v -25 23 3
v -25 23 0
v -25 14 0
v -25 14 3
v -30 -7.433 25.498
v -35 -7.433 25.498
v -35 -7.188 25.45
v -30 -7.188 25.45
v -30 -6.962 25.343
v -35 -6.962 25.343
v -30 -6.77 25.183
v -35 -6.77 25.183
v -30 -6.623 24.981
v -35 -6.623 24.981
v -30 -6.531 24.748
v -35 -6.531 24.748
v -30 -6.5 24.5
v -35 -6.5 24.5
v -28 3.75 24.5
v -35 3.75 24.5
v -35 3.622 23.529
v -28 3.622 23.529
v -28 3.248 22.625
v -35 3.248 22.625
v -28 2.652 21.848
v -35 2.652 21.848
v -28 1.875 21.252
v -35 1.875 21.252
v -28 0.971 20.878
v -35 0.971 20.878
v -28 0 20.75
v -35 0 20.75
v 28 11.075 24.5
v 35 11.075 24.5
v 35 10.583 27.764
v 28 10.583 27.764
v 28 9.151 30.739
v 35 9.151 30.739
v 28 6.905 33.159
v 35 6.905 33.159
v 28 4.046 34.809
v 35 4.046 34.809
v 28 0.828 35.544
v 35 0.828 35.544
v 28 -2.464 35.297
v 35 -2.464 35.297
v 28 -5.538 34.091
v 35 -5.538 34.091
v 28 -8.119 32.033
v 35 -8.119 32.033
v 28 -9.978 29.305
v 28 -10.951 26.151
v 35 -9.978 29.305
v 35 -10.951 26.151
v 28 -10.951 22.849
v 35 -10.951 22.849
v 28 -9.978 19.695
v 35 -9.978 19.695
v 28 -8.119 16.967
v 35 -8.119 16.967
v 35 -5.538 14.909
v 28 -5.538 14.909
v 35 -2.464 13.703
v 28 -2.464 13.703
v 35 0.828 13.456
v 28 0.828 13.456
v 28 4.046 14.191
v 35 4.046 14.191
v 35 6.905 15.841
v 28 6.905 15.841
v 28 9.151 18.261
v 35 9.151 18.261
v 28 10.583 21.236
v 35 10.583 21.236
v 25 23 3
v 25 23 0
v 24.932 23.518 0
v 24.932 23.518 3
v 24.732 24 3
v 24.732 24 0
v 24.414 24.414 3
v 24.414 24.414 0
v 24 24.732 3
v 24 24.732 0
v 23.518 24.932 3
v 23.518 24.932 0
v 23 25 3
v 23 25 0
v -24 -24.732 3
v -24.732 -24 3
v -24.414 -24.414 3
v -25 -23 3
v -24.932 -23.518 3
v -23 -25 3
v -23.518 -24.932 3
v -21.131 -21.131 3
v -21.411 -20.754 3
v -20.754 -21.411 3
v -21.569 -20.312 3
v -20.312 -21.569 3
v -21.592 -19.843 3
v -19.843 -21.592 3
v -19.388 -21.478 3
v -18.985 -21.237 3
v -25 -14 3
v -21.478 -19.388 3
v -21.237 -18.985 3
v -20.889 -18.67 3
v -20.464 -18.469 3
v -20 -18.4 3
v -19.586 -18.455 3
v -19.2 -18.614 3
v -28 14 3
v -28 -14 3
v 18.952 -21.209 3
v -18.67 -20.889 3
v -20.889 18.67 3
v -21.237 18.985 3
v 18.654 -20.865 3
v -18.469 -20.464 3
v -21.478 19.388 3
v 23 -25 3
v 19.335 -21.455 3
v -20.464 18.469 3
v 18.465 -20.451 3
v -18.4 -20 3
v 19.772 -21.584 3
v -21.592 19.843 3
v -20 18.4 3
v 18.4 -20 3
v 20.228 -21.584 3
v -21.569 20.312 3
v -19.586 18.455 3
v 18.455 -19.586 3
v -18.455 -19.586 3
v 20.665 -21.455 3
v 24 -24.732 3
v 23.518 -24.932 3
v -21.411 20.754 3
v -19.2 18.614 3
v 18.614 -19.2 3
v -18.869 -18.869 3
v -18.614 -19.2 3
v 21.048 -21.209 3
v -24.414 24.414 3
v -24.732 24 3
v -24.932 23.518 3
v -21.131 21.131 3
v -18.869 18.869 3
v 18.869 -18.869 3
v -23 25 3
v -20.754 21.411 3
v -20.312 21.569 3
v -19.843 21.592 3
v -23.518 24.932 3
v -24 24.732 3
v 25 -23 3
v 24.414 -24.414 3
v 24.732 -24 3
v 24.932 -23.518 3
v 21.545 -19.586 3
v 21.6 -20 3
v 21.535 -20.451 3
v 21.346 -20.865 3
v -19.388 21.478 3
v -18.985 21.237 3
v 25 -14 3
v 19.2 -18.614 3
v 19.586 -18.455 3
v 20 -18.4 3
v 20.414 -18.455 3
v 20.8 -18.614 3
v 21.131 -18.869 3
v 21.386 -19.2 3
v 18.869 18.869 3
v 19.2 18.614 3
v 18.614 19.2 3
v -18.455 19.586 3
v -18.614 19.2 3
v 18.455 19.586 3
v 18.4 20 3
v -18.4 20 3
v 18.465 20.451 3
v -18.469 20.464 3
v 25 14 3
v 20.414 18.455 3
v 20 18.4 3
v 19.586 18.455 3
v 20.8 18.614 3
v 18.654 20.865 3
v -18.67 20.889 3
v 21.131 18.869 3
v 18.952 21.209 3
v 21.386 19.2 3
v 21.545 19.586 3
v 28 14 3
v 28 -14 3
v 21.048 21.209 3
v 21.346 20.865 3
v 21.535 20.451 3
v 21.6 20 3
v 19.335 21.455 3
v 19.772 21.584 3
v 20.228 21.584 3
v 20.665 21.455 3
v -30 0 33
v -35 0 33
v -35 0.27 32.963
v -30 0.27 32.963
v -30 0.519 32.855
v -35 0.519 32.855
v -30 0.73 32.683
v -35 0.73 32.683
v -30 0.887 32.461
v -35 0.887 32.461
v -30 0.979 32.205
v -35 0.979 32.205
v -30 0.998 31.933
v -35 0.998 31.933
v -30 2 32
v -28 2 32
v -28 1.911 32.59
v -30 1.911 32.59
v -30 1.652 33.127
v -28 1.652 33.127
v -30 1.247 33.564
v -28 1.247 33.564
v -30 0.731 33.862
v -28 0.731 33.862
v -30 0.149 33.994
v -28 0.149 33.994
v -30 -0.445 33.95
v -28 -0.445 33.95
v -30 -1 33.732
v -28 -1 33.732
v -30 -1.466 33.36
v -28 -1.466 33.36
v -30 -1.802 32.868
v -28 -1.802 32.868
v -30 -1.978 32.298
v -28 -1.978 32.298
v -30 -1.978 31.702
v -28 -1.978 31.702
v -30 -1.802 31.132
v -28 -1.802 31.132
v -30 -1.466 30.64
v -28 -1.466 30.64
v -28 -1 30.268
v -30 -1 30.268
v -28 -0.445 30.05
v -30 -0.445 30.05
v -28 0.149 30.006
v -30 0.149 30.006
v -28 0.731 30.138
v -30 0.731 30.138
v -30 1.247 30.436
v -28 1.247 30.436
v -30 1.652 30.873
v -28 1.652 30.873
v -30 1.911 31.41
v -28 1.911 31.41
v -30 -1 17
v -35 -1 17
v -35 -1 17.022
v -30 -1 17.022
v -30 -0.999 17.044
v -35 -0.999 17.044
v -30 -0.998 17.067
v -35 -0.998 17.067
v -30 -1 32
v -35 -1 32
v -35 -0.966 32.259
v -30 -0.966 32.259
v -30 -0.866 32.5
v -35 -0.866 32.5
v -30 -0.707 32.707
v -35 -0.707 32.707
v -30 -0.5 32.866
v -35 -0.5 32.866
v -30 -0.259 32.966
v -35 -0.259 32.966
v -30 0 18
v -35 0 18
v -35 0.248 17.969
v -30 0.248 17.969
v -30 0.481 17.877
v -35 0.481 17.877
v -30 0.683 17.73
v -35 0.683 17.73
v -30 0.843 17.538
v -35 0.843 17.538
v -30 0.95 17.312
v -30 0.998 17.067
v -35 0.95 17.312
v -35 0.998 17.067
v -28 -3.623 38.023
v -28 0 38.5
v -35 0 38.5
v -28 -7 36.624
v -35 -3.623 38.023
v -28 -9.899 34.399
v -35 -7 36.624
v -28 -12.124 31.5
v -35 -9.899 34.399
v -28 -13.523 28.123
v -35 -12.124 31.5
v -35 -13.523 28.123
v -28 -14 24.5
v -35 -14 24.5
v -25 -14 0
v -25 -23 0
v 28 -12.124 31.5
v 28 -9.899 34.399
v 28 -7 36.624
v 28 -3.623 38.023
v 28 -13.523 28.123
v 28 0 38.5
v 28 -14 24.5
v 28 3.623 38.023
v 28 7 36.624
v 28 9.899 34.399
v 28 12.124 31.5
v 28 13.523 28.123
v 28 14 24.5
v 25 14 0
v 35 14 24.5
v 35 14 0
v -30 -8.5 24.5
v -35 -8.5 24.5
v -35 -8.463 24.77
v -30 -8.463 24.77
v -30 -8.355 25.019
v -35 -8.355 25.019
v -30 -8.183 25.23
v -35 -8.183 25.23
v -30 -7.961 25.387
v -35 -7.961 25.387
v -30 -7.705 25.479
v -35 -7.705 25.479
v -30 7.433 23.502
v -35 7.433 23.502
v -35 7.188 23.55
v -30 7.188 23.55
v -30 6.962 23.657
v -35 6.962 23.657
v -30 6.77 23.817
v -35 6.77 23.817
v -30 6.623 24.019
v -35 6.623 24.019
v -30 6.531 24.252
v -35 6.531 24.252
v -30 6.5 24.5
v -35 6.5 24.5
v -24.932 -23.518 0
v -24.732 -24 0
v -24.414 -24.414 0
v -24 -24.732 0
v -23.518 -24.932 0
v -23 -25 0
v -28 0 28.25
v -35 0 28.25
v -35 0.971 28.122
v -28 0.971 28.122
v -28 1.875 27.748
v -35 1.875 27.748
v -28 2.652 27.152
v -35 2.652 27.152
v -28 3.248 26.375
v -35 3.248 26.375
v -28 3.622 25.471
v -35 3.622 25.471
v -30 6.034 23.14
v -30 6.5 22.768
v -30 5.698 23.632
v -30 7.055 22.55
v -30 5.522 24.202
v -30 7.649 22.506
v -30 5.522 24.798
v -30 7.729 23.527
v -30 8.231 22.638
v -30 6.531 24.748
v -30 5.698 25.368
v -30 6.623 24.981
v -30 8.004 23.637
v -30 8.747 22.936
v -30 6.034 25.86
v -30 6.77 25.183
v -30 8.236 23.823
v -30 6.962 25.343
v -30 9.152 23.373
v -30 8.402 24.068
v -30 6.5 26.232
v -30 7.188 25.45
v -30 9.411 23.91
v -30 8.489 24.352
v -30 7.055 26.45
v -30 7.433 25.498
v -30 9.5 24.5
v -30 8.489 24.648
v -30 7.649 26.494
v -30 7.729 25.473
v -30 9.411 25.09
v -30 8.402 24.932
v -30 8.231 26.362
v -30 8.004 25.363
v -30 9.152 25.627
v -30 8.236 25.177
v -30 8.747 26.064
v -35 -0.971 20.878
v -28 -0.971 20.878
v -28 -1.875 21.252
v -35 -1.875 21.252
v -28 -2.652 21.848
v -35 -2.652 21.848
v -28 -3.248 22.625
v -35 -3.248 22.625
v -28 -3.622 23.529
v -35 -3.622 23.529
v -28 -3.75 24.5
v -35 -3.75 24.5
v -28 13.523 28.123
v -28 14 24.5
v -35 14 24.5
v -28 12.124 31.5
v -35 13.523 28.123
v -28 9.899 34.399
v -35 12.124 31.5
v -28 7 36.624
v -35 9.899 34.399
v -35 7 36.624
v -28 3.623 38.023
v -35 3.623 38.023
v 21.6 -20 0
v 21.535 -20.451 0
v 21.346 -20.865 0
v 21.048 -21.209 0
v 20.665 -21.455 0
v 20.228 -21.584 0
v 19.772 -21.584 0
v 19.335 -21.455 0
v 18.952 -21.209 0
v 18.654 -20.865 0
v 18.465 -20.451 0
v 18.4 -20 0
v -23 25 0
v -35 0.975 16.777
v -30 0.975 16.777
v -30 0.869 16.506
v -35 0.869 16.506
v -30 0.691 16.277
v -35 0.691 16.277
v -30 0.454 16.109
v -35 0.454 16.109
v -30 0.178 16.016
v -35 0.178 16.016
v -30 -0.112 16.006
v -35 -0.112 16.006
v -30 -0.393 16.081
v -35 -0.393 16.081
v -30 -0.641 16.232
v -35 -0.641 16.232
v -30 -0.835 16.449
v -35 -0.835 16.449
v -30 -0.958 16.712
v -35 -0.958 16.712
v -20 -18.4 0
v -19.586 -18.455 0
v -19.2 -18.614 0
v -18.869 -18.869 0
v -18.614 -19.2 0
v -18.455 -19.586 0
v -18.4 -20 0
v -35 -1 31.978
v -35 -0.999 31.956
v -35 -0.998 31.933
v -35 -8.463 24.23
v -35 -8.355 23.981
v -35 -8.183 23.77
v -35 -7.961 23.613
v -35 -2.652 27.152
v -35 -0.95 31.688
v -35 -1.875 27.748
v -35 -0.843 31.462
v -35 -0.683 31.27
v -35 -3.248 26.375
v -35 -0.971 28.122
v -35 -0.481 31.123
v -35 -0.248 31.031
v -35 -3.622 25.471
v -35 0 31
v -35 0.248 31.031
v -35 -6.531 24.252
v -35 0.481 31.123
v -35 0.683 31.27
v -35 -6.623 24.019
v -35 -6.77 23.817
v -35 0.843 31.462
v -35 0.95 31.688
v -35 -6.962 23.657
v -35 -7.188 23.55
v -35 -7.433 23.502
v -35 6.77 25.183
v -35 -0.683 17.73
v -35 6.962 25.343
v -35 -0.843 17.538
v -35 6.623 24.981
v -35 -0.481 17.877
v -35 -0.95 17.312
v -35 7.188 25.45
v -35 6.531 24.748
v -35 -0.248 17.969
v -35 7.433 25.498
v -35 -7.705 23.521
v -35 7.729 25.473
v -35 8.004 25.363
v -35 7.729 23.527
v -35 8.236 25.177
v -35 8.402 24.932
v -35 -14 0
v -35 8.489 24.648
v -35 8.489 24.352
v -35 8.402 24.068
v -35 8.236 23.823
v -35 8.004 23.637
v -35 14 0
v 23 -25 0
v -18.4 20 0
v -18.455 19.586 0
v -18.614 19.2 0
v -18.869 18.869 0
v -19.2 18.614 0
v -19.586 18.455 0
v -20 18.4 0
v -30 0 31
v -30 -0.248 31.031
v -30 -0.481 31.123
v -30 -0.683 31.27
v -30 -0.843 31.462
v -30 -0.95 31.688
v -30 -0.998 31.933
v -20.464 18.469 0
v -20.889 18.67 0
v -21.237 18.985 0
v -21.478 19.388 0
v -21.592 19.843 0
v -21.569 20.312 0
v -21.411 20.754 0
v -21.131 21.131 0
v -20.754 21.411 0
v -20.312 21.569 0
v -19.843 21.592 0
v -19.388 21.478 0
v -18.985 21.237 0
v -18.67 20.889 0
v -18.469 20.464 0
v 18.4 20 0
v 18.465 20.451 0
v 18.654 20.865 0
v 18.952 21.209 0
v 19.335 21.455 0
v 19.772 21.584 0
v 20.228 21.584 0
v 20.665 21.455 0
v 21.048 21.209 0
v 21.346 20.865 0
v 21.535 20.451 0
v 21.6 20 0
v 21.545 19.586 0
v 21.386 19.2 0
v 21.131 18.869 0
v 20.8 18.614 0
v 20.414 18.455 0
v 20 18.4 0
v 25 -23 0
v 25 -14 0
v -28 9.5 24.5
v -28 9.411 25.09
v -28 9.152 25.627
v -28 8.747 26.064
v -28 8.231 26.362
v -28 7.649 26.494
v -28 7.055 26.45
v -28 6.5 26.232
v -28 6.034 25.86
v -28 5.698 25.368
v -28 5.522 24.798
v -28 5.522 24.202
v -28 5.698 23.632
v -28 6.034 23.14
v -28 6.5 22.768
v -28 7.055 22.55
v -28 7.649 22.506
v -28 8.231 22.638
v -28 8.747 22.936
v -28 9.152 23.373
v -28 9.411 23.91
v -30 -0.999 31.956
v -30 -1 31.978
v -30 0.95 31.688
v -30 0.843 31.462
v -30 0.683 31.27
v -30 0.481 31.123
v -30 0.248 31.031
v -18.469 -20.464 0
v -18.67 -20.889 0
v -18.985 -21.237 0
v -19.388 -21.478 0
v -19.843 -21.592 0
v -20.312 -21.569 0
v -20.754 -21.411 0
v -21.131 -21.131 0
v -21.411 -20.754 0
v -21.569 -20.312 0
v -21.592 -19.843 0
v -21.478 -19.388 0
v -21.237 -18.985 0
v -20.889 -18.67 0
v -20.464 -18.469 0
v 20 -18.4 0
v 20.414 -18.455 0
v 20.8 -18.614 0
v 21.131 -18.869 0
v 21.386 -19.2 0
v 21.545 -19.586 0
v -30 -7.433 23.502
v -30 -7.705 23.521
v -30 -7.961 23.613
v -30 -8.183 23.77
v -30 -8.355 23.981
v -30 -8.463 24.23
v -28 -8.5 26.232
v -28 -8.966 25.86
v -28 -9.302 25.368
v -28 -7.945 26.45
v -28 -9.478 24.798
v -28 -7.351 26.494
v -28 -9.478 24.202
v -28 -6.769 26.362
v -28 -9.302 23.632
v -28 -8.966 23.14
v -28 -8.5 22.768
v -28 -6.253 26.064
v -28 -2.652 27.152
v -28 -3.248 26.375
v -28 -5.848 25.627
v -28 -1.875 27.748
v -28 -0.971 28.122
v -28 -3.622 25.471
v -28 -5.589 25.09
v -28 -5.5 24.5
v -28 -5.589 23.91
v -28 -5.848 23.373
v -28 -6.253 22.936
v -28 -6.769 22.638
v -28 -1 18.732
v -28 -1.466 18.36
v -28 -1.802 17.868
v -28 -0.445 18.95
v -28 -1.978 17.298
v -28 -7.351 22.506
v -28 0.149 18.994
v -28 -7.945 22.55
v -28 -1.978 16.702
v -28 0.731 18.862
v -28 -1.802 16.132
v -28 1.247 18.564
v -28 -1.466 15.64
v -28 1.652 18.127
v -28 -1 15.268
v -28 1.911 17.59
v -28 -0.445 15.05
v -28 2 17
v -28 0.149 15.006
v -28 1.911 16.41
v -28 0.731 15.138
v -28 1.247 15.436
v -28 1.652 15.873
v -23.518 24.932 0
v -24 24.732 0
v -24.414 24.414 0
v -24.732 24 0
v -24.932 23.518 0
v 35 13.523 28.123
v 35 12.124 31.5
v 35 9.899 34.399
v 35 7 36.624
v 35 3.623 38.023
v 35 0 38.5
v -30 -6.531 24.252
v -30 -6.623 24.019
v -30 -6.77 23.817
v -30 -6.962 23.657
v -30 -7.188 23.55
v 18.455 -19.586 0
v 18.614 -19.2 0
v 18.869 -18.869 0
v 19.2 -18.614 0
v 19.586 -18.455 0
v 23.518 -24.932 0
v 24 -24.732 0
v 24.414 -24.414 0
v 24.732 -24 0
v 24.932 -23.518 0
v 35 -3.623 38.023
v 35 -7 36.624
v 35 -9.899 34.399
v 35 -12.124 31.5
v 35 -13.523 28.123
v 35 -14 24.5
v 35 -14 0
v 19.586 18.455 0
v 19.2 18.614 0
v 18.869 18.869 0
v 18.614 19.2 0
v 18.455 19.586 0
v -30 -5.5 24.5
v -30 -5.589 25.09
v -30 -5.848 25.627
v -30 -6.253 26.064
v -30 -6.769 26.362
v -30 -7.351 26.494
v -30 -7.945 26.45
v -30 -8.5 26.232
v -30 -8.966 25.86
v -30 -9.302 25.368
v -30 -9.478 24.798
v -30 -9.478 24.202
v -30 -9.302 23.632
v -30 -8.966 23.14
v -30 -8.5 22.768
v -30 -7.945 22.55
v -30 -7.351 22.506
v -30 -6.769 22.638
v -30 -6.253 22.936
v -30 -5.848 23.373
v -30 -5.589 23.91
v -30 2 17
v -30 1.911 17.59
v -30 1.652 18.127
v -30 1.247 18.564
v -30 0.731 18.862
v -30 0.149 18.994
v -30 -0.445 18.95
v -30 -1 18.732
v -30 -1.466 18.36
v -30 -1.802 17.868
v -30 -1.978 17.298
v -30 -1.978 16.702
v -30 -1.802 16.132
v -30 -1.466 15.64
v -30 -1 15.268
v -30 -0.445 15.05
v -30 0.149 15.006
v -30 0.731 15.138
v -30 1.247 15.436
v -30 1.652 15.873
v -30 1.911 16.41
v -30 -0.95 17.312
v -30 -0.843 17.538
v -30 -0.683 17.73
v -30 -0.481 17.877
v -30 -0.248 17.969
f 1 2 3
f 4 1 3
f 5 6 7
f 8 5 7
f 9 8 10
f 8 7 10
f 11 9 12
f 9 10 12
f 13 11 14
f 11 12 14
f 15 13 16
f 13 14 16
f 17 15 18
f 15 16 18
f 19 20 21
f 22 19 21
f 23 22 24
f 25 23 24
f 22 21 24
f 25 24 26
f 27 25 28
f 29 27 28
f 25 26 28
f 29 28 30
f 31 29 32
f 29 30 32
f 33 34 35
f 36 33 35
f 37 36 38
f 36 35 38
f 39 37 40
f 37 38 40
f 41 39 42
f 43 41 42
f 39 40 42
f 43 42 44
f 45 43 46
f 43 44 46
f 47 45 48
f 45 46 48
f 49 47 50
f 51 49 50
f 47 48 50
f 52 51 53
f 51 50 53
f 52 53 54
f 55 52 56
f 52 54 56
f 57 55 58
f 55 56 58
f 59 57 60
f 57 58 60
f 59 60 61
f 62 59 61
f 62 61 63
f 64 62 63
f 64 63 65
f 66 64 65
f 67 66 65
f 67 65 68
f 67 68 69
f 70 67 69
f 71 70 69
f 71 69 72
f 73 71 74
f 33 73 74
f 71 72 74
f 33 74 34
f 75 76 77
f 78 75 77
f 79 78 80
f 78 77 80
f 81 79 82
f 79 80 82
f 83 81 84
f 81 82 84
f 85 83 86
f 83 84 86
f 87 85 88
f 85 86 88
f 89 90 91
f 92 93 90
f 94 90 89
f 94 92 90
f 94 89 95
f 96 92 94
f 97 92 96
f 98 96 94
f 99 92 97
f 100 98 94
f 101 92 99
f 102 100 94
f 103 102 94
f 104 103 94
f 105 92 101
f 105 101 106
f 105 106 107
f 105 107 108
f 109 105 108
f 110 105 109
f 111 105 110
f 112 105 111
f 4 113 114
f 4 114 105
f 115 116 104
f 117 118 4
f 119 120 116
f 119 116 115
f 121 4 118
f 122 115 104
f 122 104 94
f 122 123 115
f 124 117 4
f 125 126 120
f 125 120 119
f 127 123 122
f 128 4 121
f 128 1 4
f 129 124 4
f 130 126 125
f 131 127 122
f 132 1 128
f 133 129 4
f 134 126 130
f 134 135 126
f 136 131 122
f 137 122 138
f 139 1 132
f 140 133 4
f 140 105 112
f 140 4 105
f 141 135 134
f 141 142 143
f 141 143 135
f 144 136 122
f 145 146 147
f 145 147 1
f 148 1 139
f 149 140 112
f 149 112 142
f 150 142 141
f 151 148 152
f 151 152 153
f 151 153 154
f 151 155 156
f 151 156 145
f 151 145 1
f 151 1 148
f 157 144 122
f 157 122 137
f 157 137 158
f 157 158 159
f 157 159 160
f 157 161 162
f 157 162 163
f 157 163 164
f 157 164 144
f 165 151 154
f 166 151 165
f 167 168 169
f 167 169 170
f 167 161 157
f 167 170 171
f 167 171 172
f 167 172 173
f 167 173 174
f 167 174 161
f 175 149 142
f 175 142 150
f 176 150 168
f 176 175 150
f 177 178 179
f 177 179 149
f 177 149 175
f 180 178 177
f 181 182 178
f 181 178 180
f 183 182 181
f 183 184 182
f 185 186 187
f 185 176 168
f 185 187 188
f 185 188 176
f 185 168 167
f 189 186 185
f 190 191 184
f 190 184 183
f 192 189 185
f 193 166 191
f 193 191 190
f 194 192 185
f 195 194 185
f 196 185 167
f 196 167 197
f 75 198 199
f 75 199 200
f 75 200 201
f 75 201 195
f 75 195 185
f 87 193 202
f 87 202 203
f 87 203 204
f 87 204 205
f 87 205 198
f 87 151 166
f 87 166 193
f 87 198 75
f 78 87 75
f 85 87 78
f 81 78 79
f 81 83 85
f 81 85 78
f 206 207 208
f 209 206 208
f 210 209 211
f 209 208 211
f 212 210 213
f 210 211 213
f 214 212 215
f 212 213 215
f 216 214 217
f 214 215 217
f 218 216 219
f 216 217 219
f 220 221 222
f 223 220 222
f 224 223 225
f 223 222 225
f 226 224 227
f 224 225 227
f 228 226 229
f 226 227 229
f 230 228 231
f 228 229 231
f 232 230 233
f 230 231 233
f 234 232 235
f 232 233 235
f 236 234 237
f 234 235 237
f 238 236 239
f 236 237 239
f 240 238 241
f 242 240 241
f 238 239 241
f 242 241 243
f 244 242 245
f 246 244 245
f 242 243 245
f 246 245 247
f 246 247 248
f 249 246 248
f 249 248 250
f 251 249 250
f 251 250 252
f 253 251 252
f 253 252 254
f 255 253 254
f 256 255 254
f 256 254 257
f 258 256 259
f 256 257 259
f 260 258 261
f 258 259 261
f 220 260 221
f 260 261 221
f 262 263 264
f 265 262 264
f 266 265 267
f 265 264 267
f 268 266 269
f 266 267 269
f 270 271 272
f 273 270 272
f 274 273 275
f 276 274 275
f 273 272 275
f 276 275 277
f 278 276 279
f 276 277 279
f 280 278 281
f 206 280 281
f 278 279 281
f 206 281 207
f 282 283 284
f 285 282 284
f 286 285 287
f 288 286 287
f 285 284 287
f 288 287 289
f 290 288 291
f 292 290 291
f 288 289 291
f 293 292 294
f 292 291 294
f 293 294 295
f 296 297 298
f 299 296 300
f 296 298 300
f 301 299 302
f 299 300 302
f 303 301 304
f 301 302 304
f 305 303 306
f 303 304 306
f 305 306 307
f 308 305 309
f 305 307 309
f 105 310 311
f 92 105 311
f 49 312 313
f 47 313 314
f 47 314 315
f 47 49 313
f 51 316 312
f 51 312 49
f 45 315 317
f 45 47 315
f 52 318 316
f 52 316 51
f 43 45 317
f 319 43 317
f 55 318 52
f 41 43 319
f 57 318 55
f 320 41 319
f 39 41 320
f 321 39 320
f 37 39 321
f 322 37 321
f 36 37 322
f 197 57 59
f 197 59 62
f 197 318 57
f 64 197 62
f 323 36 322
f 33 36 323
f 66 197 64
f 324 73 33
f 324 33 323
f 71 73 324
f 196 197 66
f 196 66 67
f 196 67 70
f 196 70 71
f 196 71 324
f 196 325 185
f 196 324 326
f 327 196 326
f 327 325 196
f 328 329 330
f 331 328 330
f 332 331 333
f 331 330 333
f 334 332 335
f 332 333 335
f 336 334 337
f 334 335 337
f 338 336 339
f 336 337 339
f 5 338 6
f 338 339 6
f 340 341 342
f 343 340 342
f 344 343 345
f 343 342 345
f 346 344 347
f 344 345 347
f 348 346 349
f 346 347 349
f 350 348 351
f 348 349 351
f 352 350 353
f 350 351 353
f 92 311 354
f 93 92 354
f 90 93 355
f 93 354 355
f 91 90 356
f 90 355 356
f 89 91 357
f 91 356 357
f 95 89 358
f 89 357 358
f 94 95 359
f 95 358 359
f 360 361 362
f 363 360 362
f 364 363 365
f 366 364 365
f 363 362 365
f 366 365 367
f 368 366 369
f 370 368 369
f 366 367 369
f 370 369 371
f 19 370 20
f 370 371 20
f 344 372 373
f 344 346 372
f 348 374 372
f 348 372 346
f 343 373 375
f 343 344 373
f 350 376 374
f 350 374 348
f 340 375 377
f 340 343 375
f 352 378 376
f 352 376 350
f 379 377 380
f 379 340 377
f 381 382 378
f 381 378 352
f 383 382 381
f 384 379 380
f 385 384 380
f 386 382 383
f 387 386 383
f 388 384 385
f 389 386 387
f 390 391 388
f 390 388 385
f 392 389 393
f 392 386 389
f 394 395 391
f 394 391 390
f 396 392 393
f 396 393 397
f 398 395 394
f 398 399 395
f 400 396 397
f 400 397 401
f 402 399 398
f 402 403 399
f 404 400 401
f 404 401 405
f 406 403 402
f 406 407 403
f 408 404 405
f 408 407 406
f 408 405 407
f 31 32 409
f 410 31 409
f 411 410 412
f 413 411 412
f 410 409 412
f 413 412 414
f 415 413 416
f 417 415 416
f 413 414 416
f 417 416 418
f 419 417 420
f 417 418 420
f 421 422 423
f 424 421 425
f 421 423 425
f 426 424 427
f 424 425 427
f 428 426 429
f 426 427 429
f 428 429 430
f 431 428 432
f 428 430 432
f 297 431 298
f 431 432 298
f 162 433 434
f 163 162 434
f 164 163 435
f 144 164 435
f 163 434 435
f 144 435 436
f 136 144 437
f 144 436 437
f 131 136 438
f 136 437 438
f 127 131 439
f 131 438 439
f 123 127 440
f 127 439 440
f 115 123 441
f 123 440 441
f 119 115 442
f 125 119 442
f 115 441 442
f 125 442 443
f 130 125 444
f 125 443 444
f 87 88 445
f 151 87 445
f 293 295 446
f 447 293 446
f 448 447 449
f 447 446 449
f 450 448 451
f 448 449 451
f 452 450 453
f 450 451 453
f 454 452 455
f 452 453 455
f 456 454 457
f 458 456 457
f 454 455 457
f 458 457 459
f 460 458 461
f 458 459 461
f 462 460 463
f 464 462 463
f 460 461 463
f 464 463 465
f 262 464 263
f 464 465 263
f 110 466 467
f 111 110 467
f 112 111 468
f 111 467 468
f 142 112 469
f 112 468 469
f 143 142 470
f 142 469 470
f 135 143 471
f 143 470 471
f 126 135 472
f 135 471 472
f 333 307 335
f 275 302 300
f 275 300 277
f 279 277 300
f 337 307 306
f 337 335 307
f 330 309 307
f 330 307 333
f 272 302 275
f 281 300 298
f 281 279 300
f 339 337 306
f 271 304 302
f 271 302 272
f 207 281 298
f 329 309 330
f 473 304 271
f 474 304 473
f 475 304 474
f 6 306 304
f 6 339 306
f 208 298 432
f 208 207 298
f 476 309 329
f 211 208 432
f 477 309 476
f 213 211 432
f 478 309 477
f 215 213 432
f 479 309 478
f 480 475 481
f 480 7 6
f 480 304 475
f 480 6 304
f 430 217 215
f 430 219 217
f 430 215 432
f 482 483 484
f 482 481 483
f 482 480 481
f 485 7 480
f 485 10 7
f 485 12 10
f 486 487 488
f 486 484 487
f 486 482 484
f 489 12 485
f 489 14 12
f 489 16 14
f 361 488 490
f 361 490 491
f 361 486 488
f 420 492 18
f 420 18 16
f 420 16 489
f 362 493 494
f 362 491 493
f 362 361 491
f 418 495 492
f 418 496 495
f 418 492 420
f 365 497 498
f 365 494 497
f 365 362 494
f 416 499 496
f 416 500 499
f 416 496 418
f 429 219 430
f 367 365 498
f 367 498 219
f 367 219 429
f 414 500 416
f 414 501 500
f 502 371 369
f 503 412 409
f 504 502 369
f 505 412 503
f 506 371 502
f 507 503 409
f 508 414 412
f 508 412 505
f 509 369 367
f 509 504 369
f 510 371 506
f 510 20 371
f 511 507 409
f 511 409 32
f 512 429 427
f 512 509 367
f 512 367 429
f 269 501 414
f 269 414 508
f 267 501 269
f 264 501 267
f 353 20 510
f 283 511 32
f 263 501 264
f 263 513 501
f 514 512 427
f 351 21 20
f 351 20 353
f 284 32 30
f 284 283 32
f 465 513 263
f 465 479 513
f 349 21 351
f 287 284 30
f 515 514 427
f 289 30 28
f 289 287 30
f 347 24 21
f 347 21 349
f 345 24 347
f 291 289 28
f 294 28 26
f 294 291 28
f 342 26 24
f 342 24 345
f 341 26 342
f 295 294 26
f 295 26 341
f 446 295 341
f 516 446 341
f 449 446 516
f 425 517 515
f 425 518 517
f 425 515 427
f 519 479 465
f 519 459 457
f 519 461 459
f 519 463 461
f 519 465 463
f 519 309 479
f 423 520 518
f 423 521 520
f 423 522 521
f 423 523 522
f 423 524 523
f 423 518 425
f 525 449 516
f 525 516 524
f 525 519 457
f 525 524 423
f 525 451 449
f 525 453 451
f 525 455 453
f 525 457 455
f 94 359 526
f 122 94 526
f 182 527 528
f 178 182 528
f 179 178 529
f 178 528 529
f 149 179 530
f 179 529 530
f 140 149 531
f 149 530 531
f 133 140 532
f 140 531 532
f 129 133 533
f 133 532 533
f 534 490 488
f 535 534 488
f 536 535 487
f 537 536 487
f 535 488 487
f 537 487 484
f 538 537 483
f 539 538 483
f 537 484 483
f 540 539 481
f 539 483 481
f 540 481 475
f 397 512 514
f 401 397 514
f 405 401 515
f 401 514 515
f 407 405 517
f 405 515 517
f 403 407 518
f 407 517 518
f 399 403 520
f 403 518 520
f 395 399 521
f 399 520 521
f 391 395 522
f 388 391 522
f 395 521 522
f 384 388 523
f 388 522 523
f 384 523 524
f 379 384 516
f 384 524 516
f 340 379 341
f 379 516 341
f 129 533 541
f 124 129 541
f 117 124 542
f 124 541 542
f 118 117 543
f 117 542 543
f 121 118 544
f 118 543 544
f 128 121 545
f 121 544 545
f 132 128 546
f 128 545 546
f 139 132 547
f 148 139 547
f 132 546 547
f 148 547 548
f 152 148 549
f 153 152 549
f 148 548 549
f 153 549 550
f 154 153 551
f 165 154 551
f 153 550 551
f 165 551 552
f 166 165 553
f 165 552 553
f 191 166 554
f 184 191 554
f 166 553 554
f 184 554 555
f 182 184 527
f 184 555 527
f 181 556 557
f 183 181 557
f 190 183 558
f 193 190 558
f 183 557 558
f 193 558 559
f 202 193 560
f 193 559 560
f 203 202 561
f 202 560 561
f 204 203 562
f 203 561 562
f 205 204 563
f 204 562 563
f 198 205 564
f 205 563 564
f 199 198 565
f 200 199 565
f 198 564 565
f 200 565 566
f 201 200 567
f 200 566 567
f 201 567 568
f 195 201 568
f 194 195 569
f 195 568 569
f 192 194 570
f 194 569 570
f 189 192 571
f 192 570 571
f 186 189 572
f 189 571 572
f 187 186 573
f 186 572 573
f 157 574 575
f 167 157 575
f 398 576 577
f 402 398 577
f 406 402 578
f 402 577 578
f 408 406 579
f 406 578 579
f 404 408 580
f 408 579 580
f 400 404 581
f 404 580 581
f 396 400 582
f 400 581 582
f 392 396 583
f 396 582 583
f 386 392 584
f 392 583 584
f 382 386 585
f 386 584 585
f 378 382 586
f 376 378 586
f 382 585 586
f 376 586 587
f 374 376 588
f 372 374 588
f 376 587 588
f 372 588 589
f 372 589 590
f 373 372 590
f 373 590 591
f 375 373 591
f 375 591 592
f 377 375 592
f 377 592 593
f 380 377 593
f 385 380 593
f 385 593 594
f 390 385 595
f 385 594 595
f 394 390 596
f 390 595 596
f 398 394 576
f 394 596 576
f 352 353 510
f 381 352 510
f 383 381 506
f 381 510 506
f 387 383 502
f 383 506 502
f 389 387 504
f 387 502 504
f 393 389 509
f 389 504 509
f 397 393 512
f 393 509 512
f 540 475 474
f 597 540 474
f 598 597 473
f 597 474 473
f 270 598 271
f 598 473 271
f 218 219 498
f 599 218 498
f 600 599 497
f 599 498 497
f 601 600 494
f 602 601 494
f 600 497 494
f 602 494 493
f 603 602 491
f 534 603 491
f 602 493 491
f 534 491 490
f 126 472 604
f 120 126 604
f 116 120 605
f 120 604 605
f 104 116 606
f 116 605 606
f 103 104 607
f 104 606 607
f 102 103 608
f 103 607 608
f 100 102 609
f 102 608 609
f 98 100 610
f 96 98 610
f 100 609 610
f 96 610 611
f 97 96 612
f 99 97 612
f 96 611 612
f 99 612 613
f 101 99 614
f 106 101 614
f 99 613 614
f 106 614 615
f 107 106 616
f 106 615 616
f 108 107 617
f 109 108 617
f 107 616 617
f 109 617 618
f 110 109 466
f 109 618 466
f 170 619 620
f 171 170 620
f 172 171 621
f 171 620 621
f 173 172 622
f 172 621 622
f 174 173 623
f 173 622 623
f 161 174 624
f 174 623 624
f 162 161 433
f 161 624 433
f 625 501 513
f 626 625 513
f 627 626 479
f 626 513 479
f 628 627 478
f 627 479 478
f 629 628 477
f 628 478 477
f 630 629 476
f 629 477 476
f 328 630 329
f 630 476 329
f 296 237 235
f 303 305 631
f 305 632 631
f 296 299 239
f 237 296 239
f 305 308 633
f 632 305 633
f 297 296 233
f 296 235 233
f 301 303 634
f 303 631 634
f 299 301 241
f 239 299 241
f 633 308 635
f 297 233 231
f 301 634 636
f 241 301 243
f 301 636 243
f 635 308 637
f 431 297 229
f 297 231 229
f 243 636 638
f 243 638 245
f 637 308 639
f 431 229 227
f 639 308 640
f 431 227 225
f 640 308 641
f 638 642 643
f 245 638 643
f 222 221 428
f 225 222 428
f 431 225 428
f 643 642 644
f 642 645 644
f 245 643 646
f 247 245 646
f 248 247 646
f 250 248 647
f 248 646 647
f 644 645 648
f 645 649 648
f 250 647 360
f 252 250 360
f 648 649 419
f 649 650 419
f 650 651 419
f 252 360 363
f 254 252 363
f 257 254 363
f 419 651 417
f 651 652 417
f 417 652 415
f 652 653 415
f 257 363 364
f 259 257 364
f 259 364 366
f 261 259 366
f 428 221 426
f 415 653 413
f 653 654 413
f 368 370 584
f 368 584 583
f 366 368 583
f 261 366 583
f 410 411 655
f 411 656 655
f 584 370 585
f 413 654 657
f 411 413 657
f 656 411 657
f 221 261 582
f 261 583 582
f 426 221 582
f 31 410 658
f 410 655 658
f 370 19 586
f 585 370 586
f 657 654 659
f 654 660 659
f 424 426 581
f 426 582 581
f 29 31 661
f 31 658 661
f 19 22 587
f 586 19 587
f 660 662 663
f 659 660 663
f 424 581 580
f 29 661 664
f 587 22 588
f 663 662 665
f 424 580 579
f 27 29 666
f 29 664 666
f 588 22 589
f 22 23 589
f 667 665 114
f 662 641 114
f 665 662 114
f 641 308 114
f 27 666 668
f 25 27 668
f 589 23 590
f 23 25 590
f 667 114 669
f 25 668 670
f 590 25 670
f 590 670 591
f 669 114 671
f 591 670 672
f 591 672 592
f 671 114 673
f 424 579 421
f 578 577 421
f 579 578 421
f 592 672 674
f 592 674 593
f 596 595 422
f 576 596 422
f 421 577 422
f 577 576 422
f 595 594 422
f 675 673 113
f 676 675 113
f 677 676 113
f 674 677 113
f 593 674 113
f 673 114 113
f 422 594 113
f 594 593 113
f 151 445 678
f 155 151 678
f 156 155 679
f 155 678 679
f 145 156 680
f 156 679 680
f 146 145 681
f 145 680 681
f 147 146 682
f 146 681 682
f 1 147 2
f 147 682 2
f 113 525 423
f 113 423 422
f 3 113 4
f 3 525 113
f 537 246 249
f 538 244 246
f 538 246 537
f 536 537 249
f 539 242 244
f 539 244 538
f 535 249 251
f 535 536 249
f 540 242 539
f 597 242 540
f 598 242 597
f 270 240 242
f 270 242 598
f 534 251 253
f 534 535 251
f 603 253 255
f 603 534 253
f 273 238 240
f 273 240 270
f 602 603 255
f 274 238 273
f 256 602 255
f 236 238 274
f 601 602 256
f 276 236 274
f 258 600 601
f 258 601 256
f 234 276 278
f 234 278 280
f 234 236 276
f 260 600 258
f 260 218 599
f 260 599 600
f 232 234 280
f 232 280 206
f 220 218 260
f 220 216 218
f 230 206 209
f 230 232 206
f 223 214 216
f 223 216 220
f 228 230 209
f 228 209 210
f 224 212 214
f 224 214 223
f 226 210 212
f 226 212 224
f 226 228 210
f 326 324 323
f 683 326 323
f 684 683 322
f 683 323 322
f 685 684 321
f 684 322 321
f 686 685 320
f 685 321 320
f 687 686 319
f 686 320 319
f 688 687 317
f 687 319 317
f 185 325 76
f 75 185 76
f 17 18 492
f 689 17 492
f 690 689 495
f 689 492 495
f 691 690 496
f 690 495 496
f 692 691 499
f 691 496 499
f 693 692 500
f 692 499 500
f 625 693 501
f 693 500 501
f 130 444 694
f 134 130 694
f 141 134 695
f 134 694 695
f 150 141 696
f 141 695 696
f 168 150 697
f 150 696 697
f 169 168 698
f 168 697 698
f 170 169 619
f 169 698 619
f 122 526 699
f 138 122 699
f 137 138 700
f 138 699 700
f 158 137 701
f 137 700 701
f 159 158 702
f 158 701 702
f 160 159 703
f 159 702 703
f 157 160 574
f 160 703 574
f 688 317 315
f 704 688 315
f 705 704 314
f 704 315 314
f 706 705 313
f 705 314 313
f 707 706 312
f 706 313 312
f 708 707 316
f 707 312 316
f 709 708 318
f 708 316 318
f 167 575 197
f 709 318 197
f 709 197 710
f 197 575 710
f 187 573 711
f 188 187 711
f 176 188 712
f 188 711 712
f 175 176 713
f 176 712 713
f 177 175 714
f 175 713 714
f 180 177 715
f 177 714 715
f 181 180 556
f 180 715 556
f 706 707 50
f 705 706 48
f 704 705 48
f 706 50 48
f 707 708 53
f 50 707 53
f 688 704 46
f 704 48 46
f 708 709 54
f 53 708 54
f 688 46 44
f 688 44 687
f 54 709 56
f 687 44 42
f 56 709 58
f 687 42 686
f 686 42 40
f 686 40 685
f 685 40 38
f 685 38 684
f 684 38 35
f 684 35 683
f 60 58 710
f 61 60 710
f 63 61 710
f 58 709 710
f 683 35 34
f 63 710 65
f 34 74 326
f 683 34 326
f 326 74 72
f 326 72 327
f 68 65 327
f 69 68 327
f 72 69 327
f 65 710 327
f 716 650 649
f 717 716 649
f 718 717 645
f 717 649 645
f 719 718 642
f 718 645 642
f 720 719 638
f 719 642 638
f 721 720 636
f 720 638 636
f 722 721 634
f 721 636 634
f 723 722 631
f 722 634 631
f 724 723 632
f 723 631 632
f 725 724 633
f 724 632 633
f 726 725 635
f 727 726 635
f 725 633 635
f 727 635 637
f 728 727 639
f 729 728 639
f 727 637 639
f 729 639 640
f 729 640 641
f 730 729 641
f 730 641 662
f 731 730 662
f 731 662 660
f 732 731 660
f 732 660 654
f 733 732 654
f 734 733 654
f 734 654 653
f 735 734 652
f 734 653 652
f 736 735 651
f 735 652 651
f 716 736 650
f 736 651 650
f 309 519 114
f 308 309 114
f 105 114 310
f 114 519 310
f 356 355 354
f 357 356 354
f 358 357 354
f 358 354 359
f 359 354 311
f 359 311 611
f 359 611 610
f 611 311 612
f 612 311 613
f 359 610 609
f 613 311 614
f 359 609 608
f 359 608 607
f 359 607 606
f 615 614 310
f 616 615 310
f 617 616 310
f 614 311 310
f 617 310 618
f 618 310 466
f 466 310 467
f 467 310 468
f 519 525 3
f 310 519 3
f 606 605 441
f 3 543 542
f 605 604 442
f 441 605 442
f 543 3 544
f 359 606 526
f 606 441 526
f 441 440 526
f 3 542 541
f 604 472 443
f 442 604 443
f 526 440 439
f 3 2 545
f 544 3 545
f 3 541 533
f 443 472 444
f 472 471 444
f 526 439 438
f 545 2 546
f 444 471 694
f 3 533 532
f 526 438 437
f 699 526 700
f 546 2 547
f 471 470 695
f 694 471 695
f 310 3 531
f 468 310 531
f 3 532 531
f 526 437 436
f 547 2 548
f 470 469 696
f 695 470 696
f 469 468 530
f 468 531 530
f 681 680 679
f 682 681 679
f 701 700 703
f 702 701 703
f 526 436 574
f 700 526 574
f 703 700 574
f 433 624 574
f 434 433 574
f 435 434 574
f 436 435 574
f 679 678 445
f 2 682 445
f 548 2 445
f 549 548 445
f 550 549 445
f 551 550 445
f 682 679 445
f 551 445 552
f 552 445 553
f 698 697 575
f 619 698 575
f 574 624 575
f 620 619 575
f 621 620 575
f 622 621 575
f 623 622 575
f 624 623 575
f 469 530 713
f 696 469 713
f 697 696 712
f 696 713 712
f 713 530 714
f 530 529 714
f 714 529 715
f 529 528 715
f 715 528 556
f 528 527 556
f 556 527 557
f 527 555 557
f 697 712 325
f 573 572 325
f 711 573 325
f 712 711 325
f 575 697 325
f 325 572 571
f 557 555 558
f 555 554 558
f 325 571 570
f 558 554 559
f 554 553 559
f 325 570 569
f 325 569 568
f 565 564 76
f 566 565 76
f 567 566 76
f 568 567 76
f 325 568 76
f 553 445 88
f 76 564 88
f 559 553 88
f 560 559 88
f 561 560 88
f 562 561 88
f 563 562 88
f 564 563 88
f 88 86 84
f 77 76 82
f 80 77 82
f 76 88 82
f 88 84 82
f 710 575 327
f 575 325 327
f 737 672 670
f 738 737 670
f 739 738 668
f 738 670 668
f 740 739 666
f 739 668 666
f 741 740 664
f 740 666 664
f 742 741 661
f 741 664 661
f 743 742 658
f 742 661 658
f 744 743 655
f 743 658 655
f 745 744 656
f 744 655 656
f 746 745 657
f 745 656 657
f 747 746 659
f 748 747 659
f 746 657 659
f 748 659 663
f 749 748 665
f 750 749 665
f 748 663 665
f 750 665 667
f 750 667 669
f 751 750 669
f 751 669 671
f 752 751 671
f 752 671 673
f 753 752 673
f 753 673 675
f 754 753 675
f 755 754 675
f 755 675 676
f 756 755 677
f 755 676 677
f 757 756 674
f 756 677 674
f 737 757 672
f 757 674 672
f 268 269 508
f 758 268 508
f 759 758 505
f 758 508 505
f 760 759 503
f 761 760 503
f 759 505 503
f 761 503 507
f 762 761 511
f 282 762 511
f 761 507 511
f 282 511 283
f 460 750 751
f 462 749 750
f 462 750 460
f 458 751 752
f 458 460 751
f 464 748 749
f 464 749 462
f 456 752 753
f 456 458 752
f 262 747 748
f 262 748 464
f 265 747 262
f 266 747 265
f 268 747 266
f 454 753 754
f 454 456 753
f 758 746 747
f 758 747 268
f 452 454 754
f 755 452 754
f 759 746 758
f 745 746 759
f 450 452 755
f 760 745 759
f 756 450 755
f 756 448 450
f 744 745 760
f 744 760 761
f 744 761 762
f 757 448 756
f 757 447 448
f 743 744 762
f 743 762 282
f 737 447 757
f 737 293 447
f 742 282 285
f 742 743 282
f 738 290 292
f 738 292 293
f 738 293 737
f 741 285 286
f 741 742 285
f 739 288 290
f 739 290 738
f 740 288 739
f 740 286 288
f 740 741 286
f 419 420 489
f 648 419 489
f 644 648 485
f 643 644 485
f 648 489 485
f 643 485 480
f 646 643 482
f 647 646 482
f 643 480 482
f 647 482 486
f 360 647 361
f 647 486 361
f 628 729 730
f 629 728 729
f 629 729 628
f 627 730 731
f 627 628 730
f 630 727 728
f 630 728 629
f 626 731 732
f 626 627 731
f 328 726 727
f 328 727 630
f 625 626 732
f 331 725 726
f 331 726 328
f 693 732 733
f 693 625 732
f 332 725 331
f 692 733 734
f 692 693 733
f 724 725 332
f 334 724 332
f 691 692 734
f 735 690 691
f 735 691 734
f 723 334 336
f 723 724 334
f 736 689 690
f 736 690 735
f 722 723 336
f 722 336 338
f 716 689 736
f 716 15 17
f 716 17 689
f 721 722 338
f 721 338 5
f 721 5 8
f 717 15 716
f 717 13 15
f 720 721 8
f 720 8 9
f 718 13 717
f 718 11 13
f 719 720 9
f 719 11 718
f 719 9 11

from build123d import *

# Parameters (mm, degrees)
F0_W      = 10
F0_H      = 14
F1_DEPTH  = 3
F2_W      = 7
F2_H      = 28
F3_DEPTH  = 35.5
F5_DEPTH  = 70.001
F6_R      = 11.075
F7_DEPTH  = 7
F9_DEPTH  = 25
F10_R     = 2
F11_DEPTH = 2


with BuildPart() as f1:
    # F0 (on Top) → F1 (new body)
    with BuildSketch(Plane.XY):
        with BuildLine():
            ThreePointArc((25, 23), (24.4142135624, 24.4142135624), (23, 25))
            Line((23, 25), (-23, 25))
            ThreePointArc((-23, 25), (-24.4142135624, 24.4142135624), (-25, 23))
            Line((-25, 23), (-25, 14))
            Line((-25, 14), (-25, 0))
            Line((-25, 0), (-25, -14))
            Line((-25, -14), (-25, -23))
            ThreePointArc((-25, -23), (-24.4142135624, -24.4142135624), (-23, -25))
            Line((-23, -25), (23, -25))
            ThreePointArc((23, -25), (24.4142135624, -24.4142135624), (25, -23))
            Line((25, -23), (25, -14))
            Line((25, -14), (25, 0))
            Line((25, 0), (25, 14))
            Line((25, 14), (25, 23))
        make_face()
        with BuildLine():
            ThreePointArc((-20, 18.4), (-21.1313708499, 21.1313708499), (-18.4, 20))
            Line((-18.4, 20), (18.4, 20))
            ThreePointArc((18.4, 20), (20, 21.6), (21.6, 20))
            ThreePointArc((21.6, 20), (21.1313708499, 18.8686291501), (20, 18.4))
            Line((20, 18.4), (20, -18.4))
            ThreePointArc((20, -18.4), (21.1313708499, -18.8686291501), (21.6, -20))
            ThreePointArc((21.6, -20), (20, -21.6), (18.4, -20))
            Line((18.4, -20), (-18.4, -20))
            ThreePointArc((-18.4, -20), (-21.1313708499, -21.1313708499), (-20, -18.4))
            Line((-20, -18.4), (-20, 18.4))
        make_face(mode=Mode.SUBTRACT)
        with Locations((30, 7)):
            Rectangle(F0_W, F0_H)
        with Locations((-30, 7)):
            Rectangle(F0_W, F0_H)
        with Locations((30, -7)):
            Rectangle(F0_W, F0_H)
        with Locations((-30, -7)):
            Rectangle(F0_W, F0_H)
        with BuildLine():
            Line((18.4, 20), (-18.4, 20))
            ThreePointArc((-18.4, 20), (-18.8686291501, 18.8686291501), (-20, 18.4))
            Line((-20, 18.4), (-20, -18.4))
            ThreePointArc((-20, -18.4), (-18.8686291501, -18.8686291501), (-18.4, -20))
            Line((-18.4, -20), (18.4, -20))
            ThreePointArc((18.4, -20), (18.8686291501, -18.8686291501), (20, -18.4))
            Line((20, -18.4), (20, 18.4))
            ThreePointArc((20, 18.4), (18.8686291501, 18.8686291501), (18.4, 20))
        make_face()
    extrude(amount=F1_DEPTH)

    # F2 (on face) → F3 (join)
    with BuildSketch(Plane.XY.offset(3)):
        with Locations((-31.5, 0)):
            Rectangle(F2_W, F2_H)
        with Locations((31.5, 0)):
            Rectangle(F2_W, F2_H)
    extrude(amount=F3_DEPTH)

    # F4 (on face) → F5 (cut, through all)
    with BuildSketch(Plane(origin=(-35, 0, 0), x_dir=(0, -1, 0), z_dir=(-1, 0, 0))):
        with BuildLine():
            Line((14, 38.5), (0, 38.5))
            ThreePointArc((0, 38.5), (9.8994949366, 34.3994949366), (14, 24.5))
            Line((14, 24.5), (14, 38.5))
        make_face()
        with BuildLine():
            ThreePointArc((-14, 24.5), (-9.8994949366, 34.3994949366), (0, 38.5))
            Line((0, 38.5), (-14, 38.5))
            Line((-14, 38.5), (-14, 24.5))
        make_face()
    extrude(amount=-F5_DEPTH, mode=Mode.SUBTRACT)

    # F6 (on face) → F7 (cut, through all)
    with BuildSketch(Plane.YZ.offset(35)):
        with Locations((0, 24.5)):
            Circle(F6_R)
    extrude(amount=-F7_DEPTH, mode=Mode.SUBTRACT)

    # F8 (on face) → F9 (cut)
    with BuildSketch(Plane(origin=(-35, 0, 0), x_dir=(0, -1, 0), z_dir=(-1, 0, 0))):
        with BuildLine():
            ThreePointArc((1, 32), (0.7071067812, 32.7071067812), (0, 33))
            Line((0, 33), (0, 32))
            ThreePointArc((0, 32), (0.5, 31.9833147735), (0.9977753031, 31.9333333333))
            ThreePointArc((0.9977753031, 31.9333333333), (0.999443671, 31.966648112), (1, 32))
        make_face()
        with BuildLine():
            Line((0, 32), (0, 33))
            ThreePointArc((0, 33), (-0.7302967433, 32.6831300511), (-0.9977753031, 31.9333333333))
            ThreePointArc((-0.9977753031, 31.9333333333), (-0.5, 31.9833147735), (0, 32))
        make_face()
        with BuildLine():
            Line((0, 31), (0, 32))
            ThreePointArc((0, 32), (-0.5, 31.9833147735), (-0.9977753031, 31.9333333333))
            ThreePointArc((-0.9977753031, 31.9333333333), (-0.6831300511, 31.2697032567), (0, 31))
        make_face()
        with BuildLine():
            ThreePointArc((0.9977753031, 31.9333333333), (0.5, 31.9833147735), (0, 32))
            Line((0, 32), (0, 31))
            ThreePointArc((0, 31), (0.6831300511, 31.2697032567), (0.9977753031, 31.9333333333))
        make_face()
        with BuildLine():
            ThreePointArc((-6.5, 24.5), (-6.7697032567, 25.1831300511), (-7.4333333333, 25.4977753031))
            ThreePointArc((-7.4333333333, 25.4977753031), (-7.4833147735, 25), (-7.5, 24.5))
            Line((-7.5, 24.5), (-6.5, 24.5))
        make_face()
        with BuildLine():
            ThreePointArc((-7.5, 24.5), (-7.4833147735, 25), (-7.4333333333, 25.4977753031))
            ThreePointArc((-7.4333333333, 25.4977753031), (-8.5, 24.5), (-7.4333333333, 23.5022246969))
            ThreePointArc((-7.4333333333, 23.5022246969), (-7.4833147735, 24), (-7.5, 24.5))
        make_face()
        with BuildLine():
            ThreePointArc((8.5, 24.5), (8.1831300511, 25.2302967433), (7.4333333333, 25.4977753031))
            ThreePointArc((7.4333333333, 25.4977753031), (7.4833147735, 25), (7.5, 24.5))
            ThreePointArc((7.5, 24.5), (7.4833147735, 24), (7.4333333333, 23.5022246969))
            ThreePointArc((7.4333333333, 23.5022246969), (8.1831300511, 23.7697032567), (8.5, 24.5))
        make_face()
        with BuildLine():
            ThreePointArc((7.5, 24.5), (7.4833147735, 25), (7.4333333333, 25.4977753031))
            ThreePointArc((7.4333333333, 25.4977753031), (6.7697032567, 25.1831300511), (6.5, 24.5))
            Line((6.5, 24.5), (7.5, 24.5))
        make_face()
        with BuildLine():
            ThreePointArc((3.75, 24.5), (2.6516504294, 27.1516504294), (0, 28.25))
            Line((0, 28.25), (0, 24.5))
            Line((0, 24.5), (3.75, 24.5))
        make_face()
        with BuildLine():
            Line((0, 24.5), (0, 28.25))
            ThreePointArc((0, 28.25), (-2.6516504294, 27.1516504294), (-3.75, 24.5))
            Line((-3.75, 24.5), (0, 24.5))
        make_face()
        with BuildLine():
            Line((-6.5, 24.5), (-7.5, 24.5))
            ThreePointArc((-7.5, 24.5), (-7.4833147735, 24), (-7.4333333333, 23.5022246969))
            ThreePointArc((-7.4333333333, 23.5022246969), (-6.7697032567, 23.8168699489), (-6.5, 24.5))
        make_face()
        with BuildLine():
            ThreePointArc((7.4333333333, 23.5022246969), (7.4833147735, 24), (7.5, 24.5))
            Line((7.5, 24.5), (6.5, 24.5))
            ThreePointArc((6.5, 24.5), (6.7697032567, 23.8168699489), (7.4333333333, 23.5022246969))
        make_face()
        with BuildLine():
            Line((3.75, 24.5), (0, 24.5))
            Line((0, 24.5), (0, 20.75))
            ThreePointArc((0, 20.75), (2.6516504294, 21.8483495706), (3.75, 24.5))
        make_face()
        with BuildLine():
            Line((0, 20.75), (0, 24.5))
            Line((0, 24.5), (-3.75, 24.5))
            ThreePointArc((-3.75, 24.5), (-2.6516504294, 21.8483495706), (0, 20.75))
        make_face()
        with BuildLine():
            ThreePointArc((0, 18), (-0.6831300511, 17.7302967433), (-0.9977753031, 17.0666666667))
            ThreePointArc((-0.9977753031, 17.0666666667), (-0.5, 17.0166852265), (0, 17))
            Line((0, 17), (0, 18))
        make_face()
        with BuildLine():
            ThreePointArc((0, 17), (-0.5, 17.0166852265), (-0.9977753031, 17.0666666667))
            ThreePointArc((-0.9977753031, 17.0666666667), (-0.033351888, 16.000556329), (1, 17))
            ThreePointArc((1, 17), (0.999443671, 17.033351888), (0.9977753031, 17.0666666667))
            ThreePointArc((0.9977753031, 17.0666666667), (0.5, 17.0166852265), (0, 17))
        make_face()
        with BuildLine():
            Line((0, 18), (0, 17))
            ThreePointArc((0, 17), (0.5, 17.0166852265), (0.9977753031, 17.0666666667))
            ThreePointArc((0.9977753031, 17.0666666667), (0.6831300511, 17.7302967433), (0, 18))
        make_face()
    extrude(amount=-F9_DEPTH, mode=Mode.SUBTRACT)

    # F10 (on face) → F11 (cut)
    with BuildSketch(Plane.YZ.offset(-28)):
        with Locations((-7.5, 24.5)):
            Circle(F10_R)
        with Locations((0, 17)):
            Circle(F10_R)
        with Locations((0, 32)):
            Circle(F10_R)
        with Locations((7.5, 24.5)):
            Circle(F10_R)
    extrude(amount=-F11_DEPTH, mode=Mode.SUBTRACT)


solid = f1.part
